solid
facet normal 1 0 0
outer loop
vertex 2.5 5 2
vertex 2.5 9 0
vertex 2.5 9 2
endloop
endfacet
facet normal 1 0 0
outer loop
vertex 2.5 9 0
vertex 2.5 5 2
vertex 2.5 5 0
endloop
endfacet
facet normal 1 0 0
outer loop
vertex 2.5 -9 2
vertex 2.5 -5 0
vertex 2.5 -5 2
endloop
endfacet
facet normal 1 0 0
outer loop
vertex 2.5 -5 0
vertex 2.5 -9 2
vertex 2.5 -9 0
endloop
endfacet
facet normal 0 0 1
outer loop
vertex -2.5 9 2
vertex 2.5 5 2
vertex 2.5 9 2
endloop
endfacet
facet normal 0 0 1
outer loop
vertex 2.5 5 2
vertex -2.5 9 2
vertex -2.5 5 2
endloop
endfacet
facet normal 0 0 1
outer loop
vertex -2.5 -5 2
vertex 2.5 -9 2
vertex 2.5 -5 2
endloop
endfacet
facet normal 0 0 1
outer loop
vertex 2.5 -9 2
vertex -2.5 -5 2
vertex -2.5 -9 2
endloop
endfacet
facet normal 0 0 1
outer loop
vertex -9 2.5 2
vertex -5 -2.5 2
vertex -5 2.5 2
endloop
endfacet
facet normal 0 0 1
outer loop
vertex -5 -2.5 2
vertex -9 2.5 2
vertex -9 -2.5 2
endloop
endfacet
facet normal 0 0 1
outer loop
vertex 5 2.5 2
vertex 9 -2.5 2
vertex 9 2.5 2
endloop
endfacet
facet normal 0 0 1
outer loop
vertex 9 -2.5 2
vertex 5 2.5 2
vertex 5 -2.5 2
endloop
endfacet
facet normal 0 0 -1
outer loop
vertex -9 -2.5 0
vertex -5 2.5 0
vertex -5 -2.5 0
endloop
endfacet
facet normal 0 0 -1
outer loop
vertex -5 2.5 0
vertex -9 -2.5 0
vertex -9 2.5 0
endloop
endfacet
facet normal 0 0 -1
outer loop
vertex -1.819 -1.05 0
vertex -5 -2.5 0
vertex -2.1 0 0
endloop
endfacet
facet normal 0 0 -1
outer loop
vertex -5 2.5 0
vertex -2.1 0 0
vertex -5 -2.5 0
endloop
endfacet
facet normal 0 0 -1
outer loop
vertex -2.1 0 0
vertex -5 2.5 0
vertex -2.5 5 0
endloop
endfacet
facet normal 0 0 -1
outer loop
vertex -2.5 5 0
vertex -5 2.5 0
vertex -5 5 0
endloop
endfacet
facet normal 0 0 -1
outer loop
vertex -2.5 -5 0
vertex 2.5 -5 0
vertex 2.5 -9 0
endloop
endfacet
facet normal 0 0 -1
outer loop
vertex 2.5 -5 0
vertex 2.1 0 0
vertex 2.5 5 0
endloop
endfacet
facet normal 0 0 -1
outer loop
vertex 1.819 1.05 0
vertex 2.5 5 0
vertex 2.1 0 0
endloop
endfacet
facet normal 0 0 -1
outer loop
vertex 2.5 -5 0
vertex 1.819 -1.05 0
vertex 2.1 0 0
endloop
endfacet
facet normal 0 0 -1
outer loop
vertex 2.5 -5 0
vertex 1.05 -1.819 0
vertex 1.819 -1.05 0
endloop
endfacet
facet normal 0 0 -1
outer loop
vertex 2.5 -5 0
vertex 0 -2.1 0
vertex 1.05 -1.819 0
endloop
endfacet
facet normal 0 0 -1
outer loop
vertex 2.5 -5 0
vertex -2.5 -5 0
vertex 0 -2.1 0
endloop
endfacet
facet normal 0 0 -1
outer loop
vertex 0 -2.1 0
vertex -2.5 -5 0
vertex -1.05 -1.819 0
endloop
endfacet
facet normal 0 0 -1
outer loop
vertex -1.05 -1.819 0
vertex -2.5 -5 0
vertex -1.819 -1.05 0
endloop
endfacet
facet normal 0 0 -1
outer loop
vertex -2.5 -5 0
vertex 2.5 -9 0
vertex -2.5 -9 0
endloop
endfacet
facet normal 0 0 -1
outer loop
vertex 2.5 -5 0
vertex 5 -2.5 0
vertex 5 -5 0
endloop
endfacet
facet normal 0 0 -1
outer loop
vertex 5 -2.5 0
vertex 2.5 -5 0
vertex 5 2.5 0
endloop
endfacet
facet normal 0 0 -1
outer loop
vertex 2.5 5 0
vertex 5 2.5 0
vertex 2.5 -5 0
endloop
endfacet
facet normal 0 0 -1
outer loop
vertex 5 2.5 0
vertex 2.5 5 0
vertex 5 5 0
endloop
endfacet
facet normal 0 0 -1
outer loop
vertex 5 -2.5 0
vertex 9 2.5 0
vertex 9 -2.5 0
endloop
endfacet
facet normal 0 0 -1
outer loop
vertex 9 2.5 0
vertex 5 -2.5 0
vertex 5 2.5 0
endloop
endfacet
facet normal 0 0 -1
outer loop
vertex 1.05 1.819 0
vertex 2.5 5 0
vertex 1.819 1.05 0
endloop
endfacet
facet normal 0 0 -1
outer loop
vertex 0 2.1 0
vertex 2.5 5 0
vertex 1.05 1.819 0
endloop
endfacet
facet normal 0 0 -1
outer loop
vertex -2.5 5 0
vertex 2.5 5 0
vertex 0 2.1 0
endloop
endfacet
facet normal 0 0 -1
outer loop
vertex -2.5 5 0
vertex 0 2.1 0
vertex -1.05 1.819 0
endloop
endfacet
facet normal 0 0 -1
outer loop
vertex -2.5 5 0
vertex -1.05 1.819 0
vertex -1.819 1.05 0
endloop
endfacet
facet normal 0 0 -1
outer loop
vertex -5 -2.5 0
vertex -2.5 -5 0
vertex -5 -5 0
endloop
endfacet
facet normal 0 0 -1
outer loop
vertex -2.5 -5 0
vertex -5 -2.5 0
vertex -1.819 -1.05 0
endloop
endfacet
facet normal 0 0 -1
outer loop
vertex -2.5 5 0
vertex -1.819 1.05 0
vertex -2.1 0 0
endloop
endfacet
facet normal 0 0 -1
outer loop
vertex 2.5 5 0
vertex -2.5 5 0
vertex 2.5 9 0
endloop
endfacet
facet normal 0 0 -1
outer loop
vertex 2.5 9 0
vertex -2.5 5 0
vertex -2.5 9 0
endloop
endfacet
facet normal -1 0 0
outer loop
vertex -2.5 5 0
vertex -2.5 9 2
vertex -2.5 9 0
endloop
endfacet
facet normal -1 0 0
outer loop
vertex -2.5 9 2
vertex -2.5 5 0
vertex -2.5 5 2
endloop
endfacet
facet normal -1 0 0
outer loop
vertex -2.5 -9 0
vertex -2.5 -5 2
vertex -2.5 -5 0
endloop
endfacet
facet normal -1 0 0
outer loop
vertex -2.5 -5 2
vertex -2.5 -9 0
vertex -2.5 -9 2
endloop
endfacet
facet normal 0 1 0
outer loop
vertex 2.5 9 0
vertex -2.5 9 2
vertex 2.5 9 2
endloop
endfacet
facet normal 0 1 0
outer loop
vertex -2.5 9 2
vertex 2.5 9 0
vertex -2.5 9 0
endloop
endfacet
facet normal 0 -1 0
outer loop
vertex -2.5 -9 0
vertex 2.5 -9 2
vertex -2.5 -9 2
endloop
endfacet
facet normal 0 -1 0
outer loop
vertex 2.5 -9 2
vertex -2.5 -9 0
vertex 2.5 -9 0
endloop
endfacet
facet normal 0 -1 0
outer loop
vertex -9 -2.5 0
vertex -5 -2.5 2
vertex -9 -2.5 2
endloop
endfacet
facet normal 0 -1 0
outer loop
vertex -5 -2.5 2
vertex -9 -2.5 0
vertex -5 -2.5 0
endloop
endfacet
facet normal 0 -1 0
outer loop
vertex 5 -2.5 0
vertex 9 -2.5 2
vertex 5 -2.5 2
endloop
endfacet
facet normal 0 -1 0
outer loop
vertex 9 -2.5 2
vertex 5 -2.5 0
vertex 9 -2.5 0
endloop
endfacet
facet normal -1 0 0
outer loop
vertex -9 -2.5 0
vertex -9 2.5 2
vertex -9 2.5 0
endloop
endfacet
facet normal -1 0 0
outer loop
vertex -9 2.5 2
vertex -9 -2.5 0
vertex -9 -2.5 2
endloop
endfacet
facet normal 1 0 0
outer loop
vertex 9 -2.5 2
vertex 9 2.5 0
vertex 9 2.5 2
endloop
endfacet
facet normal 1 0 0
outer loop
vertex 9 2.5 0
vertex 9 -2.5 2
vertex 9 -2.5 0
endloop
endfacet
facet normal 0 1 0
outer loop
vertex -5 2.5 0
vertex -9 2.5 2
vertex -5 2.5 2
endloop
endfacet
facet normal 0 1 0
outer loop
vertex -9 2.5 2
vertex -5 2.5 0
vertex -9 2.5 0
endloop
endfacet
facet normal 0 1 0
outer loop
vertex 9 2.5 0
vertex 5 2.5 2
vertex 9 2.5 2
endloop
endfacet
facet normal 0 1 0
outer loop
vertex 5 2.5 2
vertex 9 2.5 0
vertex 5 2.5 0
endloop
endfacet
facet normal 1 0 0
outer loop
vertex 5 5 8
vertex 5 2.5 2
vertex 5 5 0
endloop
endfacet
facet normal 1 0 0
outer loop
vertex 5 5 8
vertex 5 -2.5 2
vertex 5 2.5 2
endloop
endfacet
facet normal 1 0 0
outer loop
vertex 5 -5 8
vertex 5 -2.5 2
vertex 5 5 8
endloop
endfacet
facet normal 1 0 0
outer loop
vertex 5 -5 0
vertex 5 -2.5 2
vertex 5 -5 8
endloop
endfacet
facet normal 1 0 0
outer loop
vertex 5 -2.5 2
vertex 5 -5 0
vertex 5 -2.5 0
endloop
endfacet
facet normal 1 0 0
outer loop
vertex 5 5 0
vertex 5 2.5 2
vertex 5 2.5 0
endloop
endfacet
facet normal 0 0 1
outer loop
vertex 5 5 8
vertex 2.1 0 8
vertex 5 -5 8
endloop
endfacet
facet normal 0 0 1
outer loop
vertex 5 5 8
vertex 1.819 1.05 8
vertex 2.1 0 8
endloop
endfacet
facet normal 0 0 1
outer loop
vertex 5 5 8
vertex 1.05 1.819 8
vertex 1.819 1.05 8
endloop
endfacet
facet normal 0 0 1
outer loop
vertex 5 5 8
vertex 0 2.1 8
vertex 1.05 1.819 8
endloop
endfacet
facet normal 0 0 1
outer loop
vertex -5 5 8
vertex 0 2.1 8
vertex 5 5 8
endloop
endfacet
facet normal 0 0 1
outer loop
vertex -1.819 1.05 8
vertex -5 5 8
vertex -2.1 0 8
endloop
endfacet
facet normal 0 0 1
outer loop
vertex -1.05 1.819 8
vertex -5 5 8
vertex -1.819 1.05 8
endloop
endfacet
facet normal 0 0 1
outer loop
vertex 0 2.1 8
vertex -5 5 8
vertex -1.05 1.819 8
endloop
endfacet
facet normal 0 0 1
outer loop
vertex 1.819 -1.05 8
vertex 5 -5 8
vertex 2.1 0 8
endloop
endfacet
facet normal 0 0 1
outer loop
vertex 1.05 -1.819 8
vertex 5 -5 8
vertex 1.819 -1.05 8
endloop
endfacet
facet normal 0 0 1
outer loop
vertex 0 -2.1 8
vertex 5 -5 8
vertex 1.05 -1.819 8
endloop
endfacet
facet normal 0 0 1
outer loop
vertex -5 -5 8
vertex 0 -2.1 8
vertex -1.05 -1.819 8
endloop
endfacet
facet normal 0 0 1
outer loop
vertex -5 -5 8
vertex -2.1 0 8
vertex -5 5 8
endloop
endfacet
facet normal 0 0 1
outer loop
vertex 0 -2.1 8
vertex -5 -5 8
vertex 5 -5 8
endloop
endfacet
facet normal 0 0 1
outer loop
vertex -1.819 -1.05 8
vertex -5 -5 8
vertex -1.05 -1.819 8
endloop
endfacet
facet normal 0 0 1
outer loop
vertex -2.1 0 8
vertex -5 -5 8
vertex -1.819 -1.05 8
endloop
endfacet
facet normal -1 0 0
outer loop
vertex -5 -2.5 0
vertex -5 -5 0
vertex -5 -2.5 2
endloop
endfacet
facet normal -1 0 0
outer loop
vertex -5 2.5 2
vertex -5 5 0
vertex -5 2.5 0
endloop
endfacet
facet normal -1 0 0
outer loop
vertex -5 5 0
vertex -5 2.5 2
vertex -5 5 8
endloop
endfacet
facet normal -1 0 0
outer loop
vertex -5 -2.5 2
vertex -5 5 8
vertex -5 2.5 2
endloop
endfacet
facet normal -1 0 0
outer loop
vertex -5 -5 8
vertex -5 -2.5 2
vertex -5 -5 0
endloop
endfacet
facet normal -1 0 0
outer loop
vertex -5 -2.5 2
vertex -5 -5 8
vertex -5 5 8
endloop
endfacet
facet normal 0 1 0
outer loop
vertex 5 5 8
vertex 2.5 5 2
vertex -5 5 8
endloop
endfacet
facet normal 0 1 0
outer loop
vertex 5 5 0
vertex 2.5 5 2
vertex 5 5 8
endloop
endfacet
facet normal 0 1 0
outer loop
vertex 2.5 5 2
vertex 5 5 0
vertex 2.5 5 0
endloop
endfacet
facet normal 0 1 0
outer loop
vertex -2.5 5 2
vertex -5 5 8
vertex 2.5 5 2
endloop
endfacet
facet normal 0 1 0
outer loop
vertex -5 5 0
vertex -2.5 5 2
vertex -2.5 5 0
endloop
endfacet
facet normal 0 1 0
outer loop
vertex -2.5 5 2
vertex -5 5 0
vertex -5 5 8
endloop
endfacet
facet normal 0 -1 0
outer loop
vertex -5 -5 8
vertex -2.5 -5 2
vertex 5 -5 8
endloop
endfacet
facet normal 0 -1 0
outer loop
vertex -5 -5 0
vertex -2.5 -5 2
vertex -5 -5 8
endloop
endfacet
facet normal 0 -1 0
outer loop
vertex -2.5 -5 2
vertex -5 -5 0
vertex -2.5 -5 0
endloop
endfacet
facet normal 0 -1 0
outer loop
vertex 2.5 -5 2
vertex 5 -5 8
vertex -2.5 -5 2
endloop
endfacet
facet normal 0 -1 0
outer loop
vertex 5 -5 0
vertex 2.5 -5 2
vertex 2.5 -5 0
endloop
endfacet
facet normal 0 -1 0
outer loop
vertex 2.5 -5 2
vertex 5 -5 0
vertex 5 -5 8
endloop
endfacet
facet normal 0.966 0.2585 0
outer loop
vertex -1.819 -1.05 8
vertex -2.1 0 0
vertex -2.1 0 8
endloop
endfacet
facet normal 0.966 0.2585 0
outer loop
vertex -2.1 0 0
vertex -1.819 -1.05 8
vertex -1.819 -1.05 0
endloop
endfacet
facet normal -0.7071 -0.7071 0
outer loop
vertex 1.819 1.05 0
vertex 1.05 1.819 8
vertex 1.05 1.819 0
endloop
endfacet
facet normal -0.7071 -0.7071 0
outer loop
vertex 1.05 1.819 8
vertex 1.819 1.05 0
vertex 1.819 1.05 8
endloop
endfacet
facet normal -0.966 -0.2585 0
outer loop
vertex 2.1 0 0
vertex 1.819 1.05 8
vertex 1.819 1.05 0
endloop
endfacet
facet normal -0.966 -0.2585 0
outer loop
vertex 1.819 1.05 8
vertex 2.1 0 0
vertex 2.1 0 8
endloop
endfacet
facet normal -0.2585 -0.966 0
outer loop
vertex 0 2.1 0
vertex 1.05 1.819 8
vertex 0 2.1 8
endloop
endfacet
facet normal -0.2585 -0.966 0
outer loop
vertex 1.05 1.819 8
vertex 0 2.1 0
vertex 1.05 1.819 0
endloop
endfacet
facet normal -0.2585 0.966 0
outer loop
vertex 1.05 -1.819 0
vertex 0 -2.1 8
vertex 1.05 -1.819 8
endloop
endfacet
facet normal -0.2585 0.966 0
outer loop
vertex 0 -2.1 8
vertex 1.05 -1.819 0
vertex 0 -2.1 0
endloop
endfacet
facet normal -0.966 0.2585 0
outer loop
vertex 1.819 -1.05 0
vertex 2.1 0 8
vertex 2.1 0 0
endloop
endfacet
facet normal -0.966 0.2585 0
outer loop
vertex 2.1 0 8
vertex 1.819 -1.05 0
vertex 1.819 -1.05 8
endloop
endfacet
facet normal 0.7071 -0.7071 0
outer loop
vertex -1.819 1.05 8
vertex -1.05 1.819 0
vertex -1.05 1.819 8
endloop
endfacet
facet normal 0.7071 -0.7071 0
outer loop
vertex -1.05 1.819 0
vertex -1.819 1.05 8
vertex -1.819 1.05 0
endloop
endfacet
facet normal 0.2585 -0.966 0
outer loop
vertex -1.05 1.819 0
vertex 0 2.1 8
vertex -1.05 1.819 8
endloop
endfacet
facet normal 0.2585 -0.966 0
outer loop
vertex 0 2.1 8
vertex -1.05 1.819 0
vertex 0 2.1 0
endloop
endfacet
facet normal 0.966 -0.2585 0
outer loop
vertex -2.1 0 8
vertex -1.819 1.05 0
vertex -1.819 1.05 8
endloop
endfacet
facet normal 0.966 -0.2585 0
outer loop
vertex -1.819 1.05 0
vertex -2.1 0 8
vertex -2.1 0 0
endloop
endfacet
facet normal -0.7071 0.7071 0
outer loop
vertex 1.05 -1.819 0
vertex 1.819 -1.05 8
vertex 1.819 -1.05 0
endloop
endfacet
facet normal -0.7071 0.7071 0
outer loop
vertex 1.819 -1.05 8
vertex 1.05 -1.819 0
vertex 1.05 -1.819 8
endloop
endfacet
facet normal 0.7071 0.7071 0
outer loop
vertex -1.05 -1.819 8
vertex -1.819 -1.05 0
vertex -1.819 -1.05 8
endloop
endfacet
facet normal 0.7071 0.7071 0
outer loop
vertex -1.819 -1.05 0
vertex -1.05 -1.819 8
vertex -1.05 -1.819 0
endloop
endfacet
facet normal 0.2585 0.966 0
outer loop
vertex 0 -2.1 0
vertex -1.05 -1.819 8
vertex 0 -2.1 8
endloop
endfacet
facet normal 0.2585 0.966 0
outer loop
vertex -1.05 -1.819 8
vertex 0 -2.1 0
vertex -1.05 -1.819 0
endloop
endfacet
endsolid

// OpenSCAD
difference() {
	union() {
		translate([0, 0, 8 / 2]) {
			cube([10, 10, 8], center = true);
		}

		for(a = [0, 90]) {
			rotate([0, 0, a]) {
				translate([0, 0, 2 / 2]) {
					cube([5, 18, 2], center = true);
				}
			}
		}
	}

	translate([0, 0, -0.1]) {
		cylinder(h = 10.2, d = 4.2, $fn = 12);
	}
}
